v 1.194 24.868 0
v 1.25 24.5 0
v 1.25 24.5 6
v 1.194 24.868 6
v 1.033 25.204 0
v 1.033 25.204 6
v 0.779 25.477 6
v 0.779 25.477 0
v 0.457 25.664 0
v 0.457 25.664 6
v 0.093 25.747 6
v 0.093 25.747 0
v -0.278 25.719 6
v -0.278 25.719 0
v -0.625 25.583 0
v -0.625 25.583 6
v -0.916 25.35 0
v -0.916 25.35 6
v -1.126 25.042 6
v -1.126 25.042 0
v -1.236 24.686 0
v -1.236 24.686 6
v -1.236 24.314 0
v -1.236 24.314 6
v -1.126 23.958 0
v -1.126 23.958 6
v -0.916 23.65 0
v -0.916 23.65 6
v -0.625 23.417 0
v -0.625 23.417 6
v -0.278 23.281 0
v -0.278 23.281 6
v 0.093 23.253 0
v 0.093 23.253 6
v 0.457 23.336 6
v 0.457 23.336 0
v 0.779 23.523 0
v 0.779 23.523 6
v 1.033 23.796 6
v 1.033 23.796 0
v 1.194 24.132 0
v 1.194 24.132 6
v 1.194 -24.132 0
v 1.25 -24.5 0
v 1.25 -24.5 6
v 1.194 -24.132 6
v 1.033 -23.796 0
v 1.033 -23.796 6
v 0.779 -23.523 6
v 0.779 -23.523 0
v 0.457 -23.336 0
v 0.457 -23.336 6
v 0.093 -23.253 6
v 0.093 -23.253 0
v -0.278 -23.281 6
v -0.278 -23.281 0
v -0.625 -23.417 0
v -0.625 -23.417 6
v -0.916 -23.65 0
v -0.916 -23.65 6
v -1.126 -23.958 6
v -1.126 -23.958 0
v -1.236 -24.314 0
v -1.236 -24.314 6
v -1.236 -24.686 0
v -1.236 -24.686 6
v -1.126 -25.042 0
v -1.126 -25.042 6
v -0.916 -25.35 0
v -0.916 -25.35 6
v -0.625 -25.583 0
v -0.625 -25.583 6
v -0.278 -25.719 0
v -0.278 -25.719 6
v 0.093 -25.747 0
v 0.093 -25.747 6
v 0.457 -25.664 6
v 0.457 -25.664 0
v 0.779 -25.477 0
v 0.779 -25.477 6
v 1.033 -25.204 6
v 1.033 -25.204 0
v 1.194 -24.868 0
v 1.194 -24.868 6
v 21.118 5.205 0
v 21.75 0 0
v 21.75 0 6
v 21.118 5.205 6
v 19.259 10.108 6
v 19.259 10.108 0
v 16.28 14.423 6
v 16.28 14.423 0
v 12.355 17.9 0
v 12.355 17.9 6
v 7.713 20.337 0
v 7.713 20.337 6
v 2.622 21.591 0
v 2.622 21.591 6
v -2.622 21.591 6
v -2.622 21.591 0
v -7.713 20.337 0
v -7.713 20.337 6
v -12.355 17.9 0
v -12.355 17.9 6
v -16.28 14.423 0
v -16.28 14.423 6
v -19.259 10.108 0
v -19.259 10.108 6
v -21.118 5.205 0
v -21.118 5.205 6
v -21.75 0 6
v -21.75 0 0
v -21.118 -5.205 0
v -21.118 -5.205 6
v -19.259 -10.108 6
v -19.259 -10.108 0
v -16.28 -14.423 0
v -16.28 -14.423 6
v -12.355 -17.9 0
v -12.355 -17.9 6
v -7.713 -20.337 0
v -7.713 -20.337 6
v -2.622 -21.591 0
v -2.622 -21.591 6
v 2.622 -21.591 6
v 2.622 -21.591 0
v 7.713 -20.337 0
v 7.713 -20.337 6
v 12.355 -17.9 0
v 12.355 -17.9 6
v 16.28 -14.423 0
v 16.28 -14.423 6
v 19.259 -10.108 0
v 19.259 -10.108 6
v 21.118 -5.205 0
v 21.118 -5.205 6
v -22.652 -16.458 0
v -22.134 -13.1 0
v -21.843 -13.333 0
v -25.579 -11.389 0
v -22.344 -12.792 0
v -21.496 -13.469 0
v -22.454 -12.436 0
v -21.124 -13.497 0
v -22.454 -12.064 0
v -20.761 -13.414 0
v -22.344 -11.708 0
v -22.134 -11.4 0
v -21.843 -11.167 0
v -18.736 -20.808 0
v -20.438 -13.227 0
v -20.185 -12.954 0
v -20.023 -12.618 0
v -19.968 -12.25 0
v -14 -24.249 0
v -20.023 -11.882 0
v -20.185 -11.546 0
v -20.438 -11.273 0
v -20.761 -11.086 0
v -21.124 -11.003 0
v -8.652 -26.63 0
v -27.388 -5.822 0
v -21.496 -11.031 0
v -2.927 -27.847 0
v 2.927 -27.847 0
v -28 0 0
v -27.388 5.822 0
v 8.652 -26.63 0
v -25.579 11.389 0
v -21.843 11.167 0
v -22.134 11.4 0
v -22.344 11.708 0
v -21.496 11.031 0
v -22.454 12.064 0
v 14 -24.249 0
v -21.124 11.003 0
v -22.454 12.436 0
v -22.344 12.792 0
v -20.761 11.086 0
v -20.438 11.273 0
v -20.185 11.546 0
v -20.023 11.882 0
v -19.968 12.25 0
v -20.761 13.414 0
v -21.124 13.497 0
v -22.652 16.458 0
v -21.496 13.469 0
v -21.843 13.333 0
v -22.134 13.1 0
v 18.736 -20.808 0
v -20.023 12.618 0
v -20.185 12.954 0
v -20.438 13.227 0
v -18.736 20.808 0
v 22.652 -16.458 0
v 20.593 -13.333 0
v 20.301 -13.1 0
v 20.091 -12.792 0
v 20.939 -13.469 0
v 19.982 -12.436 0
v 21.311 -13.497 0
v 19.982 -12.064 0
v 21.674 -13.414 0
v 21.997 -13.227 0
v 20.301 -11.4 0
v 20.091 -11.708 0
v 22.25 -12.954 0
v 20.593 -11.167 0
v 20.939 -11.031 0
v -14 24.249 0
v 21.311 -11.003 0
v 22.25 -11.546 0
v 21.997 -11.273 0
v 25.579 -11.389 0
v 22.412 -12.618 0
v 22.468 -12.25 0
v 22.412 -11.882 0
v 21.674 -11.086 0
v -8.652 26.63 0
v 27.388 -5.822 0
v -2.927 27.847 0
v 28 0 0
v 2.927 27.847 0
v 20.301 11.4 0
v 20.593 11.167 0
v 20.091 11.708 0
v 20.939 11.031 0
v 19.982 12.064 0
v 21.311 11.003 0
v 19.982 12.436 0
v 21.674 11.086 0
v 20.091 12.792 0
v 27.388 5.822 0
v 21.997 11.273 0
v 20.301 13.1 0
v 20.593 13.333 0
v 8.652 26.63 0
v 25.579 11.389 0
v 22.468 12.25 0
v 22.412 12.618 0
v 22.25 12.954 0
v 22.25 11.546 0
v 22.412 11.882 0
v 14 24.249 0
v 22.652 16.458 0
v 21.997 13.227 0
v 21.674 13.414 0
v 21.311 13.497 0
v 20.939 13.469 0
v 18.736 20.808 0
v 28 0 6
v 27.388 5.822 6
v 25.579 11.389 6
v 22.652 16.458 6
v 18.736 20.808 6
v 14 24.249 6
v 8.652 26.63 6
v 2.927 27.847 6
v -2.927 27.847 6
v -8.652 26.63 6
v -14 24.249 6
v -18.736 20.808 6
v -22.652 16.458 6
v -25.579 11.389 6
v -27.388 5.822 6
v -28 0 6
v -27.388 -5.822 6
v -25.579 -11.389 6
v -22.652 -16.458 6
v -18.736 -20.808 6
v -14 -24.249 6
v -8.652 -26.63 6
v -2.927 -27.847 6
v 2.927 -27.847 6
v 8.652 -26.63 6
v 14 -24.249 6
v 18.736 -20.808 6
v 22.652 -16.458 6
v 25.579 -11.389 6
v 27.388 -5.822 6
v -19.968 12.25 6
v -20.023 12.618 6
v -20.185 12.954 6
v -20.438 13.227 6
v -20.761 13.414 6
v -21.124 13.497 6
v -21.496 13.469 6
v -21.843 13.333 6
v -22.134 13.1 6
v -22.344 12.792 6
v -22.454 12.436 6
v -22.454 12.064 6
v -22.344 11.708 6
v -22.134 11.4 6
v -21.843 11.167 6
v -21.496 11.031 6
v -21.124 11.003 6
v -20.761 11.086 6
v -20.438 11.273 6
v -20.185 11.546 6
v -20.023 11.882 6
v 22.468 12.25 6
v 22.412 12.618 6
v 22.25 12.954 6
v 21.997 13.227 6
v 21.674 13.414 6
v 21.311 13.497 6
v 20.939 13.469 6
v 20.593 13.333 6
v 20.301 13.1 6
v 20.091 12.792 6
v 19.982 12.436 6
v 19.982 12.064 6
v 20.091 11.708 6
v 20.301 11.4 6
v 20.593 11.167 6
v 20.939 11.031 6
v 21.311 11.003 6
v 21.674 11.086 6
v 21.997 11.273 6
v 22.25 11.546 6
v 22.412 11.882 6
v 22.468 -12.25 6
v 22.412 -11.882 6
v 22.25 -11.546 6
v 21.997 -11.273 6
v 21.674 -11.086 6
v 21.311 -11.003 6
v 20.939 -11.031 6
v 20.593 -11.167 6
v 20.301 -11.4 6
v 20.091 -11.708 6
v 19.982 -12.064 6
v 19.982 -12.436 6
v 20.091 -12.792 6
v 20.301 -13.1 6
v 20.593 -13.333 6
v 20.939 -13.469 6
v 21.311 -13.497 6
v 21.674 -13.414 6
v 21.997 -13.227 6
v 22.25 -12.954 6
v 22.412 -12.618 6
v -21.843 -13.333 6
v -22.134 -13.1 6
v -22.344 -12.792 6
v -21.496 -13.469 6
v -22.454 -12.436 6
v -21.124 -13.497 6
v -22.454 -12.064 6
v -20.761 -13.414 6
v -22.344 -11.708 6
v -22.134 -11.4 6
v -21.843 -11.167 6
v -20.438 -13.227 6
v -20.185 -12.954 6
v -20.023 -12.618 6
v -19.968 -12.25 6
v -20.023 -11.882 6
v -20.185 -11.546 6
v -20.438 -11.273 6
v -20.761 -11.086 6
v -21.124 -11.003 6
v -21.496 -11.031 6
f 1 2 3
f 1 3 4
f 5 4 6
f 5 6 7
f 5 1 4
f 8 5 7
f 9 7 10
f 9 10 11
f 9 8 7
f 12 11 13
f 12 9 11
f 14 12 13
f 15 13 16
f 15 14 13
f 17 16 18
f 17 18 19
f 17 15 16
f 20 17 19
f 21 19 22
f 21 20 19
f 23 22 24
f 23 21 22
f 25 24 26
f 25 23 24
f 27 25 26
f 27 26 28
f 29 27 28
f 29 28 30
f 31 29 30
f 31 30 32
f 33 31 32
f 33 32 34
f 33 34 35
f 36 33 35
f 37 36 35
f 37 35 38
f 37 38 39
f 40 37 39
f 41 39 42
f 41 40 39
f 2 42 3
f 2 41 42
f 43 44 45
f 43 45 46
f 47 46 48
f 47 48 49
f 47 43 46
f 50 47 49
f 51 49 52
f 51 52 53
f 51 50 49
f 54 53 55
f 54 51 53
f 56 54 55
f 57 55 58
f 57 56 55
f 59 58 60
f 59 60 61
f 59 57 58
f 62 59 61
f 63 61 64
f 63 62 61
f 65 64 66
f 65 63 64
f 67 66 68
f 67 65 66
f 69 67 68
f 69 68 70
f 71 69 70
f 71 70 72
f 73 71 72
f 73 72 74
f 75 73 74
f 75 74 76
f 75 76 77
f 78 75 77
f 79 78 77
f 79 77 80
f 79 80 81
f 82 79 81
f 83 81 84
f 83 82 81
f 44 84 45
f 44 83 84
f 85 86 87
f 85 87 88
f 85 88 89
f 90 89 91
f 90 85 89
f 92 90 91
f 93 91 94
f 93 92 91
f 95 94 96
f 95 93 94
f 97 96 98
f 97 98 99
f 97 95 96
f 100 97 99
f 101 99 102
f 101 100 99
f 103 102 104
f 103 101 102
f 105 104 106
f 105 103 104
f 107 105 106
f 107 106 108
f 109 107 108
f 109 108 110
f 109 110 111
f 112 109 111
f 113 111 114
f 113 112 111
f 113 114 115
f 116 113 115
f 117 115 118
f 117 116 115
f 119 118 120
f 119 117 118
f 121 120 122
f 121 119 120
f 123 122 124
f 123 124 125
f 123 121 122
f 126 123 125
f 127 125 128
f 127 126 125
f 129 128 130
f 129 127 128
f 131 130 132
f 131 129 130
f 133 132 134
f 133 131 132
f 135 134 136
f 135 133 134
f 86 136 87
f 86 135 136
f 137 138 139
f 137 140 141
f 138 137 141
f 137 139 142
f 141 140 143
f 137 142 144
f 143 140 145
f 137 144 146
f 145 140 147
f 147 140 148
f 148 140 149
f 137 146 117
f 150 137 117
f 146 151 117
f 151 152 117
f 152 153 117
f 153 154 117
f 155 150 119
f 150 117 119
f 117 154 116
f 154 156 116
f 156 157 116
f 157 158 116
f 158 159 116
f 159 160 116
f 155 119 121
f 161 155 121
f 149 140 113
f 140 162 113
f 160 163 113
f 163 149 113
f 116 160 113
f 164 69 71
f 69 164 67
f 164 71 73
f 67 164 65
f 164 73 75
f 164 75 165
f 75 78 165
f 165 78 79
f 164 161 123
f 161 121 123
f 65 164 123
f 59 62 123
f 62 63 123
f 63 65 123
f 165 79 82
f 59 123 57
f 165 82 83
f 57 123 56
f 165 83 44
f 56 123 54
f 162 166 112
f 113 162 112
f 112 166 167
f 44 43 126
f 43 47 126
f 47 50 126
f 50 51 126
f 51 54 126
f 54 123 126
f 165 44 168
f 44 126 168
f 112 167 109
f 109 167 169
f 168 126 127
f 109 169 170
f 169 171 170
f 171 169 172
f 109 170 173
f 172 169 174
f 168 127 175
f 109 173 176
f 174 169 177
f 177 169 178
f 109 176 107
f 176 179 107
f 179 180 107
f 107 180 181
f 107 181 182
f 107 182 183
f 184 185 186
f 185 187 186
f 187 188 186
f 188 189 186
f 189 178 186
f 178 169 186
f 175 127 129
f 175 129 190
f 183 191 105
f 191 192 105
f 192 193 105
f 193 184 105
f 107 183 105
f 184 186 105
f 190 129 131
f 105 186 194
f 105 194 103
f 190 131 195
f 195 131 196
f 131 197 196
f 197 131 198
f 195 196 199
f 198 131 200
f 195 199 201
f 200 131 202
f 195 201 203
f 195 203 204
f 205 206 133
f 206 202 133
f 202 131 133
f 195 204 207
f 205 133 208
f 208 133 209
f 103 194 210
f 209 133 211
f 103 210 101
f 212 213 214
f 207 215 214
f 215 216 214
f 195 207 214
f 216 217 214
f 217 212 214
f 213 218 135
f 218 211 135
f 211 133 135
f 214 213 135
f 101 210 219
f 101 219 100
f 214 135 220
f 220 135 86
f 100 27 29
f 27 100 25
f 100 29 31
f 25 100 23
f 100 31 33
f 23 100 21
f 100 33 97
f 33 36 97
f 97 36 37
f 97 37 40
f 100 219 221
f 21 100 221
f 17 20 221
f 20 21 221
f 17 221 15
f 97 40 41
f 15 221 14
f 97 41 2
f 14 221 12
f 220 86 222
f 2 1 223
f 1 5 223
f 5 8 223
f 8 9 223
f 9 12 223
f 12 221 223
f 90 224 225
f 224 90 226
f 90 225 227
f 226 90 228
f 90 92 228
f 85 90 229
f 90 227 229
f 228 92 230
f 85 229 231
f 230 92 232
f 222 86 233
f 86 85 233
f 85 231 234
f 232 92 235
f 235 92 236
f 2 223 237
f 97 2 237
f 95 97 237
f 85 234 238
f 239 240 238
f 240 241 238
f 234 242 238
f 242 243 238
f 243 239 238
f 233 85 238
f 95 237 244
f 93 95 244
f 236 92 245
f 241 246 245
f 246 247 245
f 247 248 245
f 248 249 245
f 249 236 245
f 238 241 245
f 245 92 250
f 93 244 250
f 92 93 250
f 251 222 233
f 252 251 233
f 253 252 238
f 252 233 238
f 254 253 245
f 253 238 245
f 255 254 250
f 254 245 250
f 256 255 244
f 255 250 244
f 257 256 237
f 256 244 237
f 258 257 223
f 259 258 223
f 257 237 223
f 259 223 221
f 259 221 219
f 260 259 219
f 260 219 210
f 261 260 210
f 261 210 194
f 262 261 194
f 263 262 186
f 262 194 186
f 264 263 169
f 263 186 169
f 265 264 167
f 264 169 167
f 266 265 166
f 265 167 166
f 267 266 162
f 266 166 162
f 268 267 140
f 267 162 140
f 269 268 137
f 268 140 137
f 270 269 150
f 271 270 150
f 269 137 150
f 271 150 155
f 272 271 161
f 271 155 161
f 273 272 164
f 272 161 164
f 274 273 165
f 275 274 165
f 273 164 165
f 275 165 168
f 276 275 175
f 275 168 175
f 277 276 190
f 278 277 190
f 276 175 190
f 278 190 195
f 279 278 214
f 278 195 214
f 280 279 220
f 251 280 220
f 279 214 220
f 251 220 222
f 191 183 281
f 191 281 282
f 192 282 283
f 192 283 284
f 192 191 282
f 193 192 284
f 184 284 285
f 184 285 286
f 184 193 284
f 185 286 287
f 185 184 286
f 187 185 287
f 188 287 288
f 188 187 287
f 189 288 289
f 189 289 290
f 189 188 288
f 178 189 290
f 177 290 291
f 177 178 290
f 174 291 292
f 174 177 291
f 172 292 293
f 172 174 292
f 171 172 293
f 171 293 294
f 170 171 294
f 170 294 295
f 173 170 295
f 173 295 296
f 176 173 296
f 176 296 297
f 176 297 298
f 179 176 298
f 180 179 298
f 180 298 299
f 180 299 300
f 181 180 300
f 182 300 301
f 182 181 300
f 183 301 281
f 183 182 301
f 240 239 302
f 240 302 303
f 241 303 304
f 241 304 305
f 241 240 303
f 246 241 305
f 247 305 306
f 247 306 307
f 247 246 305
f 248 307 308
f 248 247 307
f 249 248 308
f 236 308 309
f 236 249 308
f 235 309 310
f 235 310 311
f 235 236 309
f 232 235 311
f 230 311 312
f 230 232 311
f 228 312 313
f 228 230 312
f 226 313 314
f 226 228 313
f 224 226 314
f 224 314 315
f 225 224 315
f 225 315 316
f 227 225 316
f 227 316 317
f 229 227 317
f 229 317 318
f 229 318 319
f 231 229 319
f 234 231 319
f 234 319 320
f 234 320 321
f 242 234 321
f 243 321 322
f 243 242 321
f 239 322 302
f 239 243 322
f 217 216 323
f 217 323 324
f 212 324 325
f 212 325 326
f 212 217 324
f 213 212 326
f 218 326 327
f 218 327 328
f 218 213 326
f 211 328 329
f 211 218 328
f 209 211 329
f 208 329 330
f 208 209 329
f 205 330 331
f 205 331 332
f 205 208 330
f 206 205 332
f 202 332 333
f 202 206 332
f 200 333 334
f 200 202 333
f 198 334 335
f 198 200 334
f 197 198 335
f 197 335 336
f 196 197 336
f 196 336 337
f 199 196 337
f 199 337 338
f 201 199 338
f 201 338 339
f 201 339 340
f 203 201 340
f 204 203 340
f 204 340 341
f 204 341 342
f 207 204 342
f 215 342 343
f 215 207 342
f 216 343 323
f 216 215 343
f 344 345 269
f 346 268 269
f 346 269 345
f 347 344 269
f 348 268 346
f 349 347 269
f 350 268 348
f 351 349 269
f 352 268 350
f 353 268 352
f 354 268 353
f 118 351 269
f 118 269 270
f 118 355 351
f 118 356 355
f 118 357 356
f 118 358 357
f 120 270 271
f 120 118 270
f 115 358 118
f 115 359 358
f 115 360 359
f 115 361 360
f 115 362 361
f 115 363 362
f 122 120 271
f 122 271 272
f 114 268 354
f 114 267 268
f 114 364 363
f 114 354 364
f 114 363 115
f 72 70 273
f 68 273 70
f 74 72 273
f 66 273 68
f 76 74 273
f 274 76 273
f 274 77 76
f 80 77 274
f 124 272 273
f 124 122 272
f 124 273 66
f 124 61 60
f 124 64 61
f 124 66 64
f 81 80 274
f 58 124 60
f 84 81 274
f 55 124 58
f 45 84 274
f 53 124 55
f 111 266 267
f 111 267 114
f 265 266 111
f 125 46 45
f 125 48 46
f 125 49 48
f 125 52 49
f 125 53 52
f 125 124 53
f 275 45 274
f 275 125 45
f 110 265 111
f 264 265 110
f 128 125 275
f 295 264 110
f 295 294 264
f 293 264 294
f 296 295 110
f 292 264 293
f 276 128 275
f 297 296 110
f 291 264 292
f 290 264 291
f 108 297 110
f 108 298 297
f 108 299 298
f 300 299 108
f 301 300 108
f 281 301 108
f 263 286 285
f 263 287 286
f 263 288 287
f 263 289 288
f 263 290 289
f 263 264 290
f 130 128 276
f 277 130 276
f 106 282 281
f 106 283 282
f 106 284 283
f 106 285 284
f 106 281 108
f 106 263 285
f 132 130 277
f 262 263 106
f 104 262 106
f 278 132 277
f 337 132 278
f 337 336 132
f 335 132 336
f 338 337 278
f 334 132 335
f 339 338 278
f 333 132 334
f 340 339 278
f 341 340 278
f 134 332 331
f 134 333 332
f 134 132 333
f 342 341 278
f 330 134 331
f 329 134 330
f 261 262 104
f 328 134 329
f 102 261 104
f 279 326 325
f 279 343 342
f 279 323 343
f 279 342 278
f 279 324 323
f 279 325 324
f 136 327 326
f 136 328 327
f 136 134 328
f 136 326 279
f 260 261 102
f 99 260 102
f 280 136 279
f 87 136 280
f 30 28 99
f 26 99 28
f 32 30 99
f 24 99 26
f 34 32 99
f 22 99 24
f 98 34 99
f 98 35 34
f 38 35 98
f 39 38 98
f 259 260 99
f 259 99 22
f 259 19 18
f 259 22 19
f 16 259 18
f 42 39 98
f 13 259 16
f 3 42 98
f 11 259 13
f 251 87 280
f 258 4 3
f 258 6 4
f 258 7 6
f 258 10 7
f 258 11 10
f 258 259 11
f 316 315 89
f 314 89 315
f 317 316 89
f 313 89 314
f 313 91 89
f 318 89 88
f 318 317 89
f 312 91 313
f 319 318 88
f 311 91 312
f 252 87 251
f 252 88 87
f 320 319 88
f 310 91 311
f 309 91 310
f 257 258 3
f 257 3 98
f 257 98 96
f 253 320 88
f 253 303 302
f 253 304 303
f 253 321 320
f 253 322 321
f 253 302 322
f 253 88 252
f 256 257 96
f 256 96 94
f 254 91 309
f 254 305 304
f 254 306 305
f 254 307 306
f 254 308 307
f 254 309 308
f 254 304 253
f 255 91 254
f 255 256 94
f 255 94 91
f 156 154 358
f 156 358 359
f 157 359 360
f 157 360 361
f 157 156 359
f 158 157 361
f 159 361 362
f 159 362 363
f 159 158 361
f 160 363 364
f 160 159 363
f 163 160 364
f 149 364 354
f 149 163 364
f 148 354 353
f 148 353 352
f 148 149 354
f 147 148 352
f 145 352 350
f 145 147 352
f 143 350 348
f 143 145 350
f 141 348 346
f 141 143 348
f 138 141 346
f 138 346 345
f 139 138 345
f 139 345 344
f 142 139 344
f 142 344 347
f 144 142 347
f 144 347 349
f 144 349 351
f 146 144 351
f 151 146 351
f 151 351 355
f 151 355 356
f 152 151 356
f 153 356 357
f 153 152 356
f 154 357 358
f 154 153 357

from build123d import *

# Parameters (mm, degrees)
SKETCH_1_R      = 28
SKETCH_1_R_2    = 1.25
SKETCH_1_R_3    = 21.75
EXTRUDE_1_DEPTH = 6


with BuildPart() as part:
    # 草图1 → 凸台-拉伸1 (new body)
    with BuildSketch(Plane.XY):
        Circle(SKETCH_1_R)
        with Locations((0, 24.5)):
            Circle(SKETCH_1_R_2, mode=Mode.SUBTRACT)
        Circle(SKETCH_1_R_3, mode=Mode.SUBTRACT)
        with Locations((21.217622393, 12.25)):
            Circle(SKETCH_1_R_2, mode=Mode.SUBTRACT)
        with Locations((21.217622393, -12.25)):
            Circle(SKETCH_1_R_2, mode=Mode.SUBTRACT)
        with Locations((0, -24.5)):
            Circle(SKETCH_1_R_2, mode=Mode.SUBTRACT)
        with Locations((-21.217622393, -12.25)):
            Circle(SKETCH_1_R_2, mode=Mode.SUBTRACT)
        with Locations((-21.217622393, 12.25)):
            Circle(SKETCH_1_R_2, mode=Mode.SUBTRACT)
    extrude(amount=EXTRUDE_1_DEPTH)


solid = part.part
